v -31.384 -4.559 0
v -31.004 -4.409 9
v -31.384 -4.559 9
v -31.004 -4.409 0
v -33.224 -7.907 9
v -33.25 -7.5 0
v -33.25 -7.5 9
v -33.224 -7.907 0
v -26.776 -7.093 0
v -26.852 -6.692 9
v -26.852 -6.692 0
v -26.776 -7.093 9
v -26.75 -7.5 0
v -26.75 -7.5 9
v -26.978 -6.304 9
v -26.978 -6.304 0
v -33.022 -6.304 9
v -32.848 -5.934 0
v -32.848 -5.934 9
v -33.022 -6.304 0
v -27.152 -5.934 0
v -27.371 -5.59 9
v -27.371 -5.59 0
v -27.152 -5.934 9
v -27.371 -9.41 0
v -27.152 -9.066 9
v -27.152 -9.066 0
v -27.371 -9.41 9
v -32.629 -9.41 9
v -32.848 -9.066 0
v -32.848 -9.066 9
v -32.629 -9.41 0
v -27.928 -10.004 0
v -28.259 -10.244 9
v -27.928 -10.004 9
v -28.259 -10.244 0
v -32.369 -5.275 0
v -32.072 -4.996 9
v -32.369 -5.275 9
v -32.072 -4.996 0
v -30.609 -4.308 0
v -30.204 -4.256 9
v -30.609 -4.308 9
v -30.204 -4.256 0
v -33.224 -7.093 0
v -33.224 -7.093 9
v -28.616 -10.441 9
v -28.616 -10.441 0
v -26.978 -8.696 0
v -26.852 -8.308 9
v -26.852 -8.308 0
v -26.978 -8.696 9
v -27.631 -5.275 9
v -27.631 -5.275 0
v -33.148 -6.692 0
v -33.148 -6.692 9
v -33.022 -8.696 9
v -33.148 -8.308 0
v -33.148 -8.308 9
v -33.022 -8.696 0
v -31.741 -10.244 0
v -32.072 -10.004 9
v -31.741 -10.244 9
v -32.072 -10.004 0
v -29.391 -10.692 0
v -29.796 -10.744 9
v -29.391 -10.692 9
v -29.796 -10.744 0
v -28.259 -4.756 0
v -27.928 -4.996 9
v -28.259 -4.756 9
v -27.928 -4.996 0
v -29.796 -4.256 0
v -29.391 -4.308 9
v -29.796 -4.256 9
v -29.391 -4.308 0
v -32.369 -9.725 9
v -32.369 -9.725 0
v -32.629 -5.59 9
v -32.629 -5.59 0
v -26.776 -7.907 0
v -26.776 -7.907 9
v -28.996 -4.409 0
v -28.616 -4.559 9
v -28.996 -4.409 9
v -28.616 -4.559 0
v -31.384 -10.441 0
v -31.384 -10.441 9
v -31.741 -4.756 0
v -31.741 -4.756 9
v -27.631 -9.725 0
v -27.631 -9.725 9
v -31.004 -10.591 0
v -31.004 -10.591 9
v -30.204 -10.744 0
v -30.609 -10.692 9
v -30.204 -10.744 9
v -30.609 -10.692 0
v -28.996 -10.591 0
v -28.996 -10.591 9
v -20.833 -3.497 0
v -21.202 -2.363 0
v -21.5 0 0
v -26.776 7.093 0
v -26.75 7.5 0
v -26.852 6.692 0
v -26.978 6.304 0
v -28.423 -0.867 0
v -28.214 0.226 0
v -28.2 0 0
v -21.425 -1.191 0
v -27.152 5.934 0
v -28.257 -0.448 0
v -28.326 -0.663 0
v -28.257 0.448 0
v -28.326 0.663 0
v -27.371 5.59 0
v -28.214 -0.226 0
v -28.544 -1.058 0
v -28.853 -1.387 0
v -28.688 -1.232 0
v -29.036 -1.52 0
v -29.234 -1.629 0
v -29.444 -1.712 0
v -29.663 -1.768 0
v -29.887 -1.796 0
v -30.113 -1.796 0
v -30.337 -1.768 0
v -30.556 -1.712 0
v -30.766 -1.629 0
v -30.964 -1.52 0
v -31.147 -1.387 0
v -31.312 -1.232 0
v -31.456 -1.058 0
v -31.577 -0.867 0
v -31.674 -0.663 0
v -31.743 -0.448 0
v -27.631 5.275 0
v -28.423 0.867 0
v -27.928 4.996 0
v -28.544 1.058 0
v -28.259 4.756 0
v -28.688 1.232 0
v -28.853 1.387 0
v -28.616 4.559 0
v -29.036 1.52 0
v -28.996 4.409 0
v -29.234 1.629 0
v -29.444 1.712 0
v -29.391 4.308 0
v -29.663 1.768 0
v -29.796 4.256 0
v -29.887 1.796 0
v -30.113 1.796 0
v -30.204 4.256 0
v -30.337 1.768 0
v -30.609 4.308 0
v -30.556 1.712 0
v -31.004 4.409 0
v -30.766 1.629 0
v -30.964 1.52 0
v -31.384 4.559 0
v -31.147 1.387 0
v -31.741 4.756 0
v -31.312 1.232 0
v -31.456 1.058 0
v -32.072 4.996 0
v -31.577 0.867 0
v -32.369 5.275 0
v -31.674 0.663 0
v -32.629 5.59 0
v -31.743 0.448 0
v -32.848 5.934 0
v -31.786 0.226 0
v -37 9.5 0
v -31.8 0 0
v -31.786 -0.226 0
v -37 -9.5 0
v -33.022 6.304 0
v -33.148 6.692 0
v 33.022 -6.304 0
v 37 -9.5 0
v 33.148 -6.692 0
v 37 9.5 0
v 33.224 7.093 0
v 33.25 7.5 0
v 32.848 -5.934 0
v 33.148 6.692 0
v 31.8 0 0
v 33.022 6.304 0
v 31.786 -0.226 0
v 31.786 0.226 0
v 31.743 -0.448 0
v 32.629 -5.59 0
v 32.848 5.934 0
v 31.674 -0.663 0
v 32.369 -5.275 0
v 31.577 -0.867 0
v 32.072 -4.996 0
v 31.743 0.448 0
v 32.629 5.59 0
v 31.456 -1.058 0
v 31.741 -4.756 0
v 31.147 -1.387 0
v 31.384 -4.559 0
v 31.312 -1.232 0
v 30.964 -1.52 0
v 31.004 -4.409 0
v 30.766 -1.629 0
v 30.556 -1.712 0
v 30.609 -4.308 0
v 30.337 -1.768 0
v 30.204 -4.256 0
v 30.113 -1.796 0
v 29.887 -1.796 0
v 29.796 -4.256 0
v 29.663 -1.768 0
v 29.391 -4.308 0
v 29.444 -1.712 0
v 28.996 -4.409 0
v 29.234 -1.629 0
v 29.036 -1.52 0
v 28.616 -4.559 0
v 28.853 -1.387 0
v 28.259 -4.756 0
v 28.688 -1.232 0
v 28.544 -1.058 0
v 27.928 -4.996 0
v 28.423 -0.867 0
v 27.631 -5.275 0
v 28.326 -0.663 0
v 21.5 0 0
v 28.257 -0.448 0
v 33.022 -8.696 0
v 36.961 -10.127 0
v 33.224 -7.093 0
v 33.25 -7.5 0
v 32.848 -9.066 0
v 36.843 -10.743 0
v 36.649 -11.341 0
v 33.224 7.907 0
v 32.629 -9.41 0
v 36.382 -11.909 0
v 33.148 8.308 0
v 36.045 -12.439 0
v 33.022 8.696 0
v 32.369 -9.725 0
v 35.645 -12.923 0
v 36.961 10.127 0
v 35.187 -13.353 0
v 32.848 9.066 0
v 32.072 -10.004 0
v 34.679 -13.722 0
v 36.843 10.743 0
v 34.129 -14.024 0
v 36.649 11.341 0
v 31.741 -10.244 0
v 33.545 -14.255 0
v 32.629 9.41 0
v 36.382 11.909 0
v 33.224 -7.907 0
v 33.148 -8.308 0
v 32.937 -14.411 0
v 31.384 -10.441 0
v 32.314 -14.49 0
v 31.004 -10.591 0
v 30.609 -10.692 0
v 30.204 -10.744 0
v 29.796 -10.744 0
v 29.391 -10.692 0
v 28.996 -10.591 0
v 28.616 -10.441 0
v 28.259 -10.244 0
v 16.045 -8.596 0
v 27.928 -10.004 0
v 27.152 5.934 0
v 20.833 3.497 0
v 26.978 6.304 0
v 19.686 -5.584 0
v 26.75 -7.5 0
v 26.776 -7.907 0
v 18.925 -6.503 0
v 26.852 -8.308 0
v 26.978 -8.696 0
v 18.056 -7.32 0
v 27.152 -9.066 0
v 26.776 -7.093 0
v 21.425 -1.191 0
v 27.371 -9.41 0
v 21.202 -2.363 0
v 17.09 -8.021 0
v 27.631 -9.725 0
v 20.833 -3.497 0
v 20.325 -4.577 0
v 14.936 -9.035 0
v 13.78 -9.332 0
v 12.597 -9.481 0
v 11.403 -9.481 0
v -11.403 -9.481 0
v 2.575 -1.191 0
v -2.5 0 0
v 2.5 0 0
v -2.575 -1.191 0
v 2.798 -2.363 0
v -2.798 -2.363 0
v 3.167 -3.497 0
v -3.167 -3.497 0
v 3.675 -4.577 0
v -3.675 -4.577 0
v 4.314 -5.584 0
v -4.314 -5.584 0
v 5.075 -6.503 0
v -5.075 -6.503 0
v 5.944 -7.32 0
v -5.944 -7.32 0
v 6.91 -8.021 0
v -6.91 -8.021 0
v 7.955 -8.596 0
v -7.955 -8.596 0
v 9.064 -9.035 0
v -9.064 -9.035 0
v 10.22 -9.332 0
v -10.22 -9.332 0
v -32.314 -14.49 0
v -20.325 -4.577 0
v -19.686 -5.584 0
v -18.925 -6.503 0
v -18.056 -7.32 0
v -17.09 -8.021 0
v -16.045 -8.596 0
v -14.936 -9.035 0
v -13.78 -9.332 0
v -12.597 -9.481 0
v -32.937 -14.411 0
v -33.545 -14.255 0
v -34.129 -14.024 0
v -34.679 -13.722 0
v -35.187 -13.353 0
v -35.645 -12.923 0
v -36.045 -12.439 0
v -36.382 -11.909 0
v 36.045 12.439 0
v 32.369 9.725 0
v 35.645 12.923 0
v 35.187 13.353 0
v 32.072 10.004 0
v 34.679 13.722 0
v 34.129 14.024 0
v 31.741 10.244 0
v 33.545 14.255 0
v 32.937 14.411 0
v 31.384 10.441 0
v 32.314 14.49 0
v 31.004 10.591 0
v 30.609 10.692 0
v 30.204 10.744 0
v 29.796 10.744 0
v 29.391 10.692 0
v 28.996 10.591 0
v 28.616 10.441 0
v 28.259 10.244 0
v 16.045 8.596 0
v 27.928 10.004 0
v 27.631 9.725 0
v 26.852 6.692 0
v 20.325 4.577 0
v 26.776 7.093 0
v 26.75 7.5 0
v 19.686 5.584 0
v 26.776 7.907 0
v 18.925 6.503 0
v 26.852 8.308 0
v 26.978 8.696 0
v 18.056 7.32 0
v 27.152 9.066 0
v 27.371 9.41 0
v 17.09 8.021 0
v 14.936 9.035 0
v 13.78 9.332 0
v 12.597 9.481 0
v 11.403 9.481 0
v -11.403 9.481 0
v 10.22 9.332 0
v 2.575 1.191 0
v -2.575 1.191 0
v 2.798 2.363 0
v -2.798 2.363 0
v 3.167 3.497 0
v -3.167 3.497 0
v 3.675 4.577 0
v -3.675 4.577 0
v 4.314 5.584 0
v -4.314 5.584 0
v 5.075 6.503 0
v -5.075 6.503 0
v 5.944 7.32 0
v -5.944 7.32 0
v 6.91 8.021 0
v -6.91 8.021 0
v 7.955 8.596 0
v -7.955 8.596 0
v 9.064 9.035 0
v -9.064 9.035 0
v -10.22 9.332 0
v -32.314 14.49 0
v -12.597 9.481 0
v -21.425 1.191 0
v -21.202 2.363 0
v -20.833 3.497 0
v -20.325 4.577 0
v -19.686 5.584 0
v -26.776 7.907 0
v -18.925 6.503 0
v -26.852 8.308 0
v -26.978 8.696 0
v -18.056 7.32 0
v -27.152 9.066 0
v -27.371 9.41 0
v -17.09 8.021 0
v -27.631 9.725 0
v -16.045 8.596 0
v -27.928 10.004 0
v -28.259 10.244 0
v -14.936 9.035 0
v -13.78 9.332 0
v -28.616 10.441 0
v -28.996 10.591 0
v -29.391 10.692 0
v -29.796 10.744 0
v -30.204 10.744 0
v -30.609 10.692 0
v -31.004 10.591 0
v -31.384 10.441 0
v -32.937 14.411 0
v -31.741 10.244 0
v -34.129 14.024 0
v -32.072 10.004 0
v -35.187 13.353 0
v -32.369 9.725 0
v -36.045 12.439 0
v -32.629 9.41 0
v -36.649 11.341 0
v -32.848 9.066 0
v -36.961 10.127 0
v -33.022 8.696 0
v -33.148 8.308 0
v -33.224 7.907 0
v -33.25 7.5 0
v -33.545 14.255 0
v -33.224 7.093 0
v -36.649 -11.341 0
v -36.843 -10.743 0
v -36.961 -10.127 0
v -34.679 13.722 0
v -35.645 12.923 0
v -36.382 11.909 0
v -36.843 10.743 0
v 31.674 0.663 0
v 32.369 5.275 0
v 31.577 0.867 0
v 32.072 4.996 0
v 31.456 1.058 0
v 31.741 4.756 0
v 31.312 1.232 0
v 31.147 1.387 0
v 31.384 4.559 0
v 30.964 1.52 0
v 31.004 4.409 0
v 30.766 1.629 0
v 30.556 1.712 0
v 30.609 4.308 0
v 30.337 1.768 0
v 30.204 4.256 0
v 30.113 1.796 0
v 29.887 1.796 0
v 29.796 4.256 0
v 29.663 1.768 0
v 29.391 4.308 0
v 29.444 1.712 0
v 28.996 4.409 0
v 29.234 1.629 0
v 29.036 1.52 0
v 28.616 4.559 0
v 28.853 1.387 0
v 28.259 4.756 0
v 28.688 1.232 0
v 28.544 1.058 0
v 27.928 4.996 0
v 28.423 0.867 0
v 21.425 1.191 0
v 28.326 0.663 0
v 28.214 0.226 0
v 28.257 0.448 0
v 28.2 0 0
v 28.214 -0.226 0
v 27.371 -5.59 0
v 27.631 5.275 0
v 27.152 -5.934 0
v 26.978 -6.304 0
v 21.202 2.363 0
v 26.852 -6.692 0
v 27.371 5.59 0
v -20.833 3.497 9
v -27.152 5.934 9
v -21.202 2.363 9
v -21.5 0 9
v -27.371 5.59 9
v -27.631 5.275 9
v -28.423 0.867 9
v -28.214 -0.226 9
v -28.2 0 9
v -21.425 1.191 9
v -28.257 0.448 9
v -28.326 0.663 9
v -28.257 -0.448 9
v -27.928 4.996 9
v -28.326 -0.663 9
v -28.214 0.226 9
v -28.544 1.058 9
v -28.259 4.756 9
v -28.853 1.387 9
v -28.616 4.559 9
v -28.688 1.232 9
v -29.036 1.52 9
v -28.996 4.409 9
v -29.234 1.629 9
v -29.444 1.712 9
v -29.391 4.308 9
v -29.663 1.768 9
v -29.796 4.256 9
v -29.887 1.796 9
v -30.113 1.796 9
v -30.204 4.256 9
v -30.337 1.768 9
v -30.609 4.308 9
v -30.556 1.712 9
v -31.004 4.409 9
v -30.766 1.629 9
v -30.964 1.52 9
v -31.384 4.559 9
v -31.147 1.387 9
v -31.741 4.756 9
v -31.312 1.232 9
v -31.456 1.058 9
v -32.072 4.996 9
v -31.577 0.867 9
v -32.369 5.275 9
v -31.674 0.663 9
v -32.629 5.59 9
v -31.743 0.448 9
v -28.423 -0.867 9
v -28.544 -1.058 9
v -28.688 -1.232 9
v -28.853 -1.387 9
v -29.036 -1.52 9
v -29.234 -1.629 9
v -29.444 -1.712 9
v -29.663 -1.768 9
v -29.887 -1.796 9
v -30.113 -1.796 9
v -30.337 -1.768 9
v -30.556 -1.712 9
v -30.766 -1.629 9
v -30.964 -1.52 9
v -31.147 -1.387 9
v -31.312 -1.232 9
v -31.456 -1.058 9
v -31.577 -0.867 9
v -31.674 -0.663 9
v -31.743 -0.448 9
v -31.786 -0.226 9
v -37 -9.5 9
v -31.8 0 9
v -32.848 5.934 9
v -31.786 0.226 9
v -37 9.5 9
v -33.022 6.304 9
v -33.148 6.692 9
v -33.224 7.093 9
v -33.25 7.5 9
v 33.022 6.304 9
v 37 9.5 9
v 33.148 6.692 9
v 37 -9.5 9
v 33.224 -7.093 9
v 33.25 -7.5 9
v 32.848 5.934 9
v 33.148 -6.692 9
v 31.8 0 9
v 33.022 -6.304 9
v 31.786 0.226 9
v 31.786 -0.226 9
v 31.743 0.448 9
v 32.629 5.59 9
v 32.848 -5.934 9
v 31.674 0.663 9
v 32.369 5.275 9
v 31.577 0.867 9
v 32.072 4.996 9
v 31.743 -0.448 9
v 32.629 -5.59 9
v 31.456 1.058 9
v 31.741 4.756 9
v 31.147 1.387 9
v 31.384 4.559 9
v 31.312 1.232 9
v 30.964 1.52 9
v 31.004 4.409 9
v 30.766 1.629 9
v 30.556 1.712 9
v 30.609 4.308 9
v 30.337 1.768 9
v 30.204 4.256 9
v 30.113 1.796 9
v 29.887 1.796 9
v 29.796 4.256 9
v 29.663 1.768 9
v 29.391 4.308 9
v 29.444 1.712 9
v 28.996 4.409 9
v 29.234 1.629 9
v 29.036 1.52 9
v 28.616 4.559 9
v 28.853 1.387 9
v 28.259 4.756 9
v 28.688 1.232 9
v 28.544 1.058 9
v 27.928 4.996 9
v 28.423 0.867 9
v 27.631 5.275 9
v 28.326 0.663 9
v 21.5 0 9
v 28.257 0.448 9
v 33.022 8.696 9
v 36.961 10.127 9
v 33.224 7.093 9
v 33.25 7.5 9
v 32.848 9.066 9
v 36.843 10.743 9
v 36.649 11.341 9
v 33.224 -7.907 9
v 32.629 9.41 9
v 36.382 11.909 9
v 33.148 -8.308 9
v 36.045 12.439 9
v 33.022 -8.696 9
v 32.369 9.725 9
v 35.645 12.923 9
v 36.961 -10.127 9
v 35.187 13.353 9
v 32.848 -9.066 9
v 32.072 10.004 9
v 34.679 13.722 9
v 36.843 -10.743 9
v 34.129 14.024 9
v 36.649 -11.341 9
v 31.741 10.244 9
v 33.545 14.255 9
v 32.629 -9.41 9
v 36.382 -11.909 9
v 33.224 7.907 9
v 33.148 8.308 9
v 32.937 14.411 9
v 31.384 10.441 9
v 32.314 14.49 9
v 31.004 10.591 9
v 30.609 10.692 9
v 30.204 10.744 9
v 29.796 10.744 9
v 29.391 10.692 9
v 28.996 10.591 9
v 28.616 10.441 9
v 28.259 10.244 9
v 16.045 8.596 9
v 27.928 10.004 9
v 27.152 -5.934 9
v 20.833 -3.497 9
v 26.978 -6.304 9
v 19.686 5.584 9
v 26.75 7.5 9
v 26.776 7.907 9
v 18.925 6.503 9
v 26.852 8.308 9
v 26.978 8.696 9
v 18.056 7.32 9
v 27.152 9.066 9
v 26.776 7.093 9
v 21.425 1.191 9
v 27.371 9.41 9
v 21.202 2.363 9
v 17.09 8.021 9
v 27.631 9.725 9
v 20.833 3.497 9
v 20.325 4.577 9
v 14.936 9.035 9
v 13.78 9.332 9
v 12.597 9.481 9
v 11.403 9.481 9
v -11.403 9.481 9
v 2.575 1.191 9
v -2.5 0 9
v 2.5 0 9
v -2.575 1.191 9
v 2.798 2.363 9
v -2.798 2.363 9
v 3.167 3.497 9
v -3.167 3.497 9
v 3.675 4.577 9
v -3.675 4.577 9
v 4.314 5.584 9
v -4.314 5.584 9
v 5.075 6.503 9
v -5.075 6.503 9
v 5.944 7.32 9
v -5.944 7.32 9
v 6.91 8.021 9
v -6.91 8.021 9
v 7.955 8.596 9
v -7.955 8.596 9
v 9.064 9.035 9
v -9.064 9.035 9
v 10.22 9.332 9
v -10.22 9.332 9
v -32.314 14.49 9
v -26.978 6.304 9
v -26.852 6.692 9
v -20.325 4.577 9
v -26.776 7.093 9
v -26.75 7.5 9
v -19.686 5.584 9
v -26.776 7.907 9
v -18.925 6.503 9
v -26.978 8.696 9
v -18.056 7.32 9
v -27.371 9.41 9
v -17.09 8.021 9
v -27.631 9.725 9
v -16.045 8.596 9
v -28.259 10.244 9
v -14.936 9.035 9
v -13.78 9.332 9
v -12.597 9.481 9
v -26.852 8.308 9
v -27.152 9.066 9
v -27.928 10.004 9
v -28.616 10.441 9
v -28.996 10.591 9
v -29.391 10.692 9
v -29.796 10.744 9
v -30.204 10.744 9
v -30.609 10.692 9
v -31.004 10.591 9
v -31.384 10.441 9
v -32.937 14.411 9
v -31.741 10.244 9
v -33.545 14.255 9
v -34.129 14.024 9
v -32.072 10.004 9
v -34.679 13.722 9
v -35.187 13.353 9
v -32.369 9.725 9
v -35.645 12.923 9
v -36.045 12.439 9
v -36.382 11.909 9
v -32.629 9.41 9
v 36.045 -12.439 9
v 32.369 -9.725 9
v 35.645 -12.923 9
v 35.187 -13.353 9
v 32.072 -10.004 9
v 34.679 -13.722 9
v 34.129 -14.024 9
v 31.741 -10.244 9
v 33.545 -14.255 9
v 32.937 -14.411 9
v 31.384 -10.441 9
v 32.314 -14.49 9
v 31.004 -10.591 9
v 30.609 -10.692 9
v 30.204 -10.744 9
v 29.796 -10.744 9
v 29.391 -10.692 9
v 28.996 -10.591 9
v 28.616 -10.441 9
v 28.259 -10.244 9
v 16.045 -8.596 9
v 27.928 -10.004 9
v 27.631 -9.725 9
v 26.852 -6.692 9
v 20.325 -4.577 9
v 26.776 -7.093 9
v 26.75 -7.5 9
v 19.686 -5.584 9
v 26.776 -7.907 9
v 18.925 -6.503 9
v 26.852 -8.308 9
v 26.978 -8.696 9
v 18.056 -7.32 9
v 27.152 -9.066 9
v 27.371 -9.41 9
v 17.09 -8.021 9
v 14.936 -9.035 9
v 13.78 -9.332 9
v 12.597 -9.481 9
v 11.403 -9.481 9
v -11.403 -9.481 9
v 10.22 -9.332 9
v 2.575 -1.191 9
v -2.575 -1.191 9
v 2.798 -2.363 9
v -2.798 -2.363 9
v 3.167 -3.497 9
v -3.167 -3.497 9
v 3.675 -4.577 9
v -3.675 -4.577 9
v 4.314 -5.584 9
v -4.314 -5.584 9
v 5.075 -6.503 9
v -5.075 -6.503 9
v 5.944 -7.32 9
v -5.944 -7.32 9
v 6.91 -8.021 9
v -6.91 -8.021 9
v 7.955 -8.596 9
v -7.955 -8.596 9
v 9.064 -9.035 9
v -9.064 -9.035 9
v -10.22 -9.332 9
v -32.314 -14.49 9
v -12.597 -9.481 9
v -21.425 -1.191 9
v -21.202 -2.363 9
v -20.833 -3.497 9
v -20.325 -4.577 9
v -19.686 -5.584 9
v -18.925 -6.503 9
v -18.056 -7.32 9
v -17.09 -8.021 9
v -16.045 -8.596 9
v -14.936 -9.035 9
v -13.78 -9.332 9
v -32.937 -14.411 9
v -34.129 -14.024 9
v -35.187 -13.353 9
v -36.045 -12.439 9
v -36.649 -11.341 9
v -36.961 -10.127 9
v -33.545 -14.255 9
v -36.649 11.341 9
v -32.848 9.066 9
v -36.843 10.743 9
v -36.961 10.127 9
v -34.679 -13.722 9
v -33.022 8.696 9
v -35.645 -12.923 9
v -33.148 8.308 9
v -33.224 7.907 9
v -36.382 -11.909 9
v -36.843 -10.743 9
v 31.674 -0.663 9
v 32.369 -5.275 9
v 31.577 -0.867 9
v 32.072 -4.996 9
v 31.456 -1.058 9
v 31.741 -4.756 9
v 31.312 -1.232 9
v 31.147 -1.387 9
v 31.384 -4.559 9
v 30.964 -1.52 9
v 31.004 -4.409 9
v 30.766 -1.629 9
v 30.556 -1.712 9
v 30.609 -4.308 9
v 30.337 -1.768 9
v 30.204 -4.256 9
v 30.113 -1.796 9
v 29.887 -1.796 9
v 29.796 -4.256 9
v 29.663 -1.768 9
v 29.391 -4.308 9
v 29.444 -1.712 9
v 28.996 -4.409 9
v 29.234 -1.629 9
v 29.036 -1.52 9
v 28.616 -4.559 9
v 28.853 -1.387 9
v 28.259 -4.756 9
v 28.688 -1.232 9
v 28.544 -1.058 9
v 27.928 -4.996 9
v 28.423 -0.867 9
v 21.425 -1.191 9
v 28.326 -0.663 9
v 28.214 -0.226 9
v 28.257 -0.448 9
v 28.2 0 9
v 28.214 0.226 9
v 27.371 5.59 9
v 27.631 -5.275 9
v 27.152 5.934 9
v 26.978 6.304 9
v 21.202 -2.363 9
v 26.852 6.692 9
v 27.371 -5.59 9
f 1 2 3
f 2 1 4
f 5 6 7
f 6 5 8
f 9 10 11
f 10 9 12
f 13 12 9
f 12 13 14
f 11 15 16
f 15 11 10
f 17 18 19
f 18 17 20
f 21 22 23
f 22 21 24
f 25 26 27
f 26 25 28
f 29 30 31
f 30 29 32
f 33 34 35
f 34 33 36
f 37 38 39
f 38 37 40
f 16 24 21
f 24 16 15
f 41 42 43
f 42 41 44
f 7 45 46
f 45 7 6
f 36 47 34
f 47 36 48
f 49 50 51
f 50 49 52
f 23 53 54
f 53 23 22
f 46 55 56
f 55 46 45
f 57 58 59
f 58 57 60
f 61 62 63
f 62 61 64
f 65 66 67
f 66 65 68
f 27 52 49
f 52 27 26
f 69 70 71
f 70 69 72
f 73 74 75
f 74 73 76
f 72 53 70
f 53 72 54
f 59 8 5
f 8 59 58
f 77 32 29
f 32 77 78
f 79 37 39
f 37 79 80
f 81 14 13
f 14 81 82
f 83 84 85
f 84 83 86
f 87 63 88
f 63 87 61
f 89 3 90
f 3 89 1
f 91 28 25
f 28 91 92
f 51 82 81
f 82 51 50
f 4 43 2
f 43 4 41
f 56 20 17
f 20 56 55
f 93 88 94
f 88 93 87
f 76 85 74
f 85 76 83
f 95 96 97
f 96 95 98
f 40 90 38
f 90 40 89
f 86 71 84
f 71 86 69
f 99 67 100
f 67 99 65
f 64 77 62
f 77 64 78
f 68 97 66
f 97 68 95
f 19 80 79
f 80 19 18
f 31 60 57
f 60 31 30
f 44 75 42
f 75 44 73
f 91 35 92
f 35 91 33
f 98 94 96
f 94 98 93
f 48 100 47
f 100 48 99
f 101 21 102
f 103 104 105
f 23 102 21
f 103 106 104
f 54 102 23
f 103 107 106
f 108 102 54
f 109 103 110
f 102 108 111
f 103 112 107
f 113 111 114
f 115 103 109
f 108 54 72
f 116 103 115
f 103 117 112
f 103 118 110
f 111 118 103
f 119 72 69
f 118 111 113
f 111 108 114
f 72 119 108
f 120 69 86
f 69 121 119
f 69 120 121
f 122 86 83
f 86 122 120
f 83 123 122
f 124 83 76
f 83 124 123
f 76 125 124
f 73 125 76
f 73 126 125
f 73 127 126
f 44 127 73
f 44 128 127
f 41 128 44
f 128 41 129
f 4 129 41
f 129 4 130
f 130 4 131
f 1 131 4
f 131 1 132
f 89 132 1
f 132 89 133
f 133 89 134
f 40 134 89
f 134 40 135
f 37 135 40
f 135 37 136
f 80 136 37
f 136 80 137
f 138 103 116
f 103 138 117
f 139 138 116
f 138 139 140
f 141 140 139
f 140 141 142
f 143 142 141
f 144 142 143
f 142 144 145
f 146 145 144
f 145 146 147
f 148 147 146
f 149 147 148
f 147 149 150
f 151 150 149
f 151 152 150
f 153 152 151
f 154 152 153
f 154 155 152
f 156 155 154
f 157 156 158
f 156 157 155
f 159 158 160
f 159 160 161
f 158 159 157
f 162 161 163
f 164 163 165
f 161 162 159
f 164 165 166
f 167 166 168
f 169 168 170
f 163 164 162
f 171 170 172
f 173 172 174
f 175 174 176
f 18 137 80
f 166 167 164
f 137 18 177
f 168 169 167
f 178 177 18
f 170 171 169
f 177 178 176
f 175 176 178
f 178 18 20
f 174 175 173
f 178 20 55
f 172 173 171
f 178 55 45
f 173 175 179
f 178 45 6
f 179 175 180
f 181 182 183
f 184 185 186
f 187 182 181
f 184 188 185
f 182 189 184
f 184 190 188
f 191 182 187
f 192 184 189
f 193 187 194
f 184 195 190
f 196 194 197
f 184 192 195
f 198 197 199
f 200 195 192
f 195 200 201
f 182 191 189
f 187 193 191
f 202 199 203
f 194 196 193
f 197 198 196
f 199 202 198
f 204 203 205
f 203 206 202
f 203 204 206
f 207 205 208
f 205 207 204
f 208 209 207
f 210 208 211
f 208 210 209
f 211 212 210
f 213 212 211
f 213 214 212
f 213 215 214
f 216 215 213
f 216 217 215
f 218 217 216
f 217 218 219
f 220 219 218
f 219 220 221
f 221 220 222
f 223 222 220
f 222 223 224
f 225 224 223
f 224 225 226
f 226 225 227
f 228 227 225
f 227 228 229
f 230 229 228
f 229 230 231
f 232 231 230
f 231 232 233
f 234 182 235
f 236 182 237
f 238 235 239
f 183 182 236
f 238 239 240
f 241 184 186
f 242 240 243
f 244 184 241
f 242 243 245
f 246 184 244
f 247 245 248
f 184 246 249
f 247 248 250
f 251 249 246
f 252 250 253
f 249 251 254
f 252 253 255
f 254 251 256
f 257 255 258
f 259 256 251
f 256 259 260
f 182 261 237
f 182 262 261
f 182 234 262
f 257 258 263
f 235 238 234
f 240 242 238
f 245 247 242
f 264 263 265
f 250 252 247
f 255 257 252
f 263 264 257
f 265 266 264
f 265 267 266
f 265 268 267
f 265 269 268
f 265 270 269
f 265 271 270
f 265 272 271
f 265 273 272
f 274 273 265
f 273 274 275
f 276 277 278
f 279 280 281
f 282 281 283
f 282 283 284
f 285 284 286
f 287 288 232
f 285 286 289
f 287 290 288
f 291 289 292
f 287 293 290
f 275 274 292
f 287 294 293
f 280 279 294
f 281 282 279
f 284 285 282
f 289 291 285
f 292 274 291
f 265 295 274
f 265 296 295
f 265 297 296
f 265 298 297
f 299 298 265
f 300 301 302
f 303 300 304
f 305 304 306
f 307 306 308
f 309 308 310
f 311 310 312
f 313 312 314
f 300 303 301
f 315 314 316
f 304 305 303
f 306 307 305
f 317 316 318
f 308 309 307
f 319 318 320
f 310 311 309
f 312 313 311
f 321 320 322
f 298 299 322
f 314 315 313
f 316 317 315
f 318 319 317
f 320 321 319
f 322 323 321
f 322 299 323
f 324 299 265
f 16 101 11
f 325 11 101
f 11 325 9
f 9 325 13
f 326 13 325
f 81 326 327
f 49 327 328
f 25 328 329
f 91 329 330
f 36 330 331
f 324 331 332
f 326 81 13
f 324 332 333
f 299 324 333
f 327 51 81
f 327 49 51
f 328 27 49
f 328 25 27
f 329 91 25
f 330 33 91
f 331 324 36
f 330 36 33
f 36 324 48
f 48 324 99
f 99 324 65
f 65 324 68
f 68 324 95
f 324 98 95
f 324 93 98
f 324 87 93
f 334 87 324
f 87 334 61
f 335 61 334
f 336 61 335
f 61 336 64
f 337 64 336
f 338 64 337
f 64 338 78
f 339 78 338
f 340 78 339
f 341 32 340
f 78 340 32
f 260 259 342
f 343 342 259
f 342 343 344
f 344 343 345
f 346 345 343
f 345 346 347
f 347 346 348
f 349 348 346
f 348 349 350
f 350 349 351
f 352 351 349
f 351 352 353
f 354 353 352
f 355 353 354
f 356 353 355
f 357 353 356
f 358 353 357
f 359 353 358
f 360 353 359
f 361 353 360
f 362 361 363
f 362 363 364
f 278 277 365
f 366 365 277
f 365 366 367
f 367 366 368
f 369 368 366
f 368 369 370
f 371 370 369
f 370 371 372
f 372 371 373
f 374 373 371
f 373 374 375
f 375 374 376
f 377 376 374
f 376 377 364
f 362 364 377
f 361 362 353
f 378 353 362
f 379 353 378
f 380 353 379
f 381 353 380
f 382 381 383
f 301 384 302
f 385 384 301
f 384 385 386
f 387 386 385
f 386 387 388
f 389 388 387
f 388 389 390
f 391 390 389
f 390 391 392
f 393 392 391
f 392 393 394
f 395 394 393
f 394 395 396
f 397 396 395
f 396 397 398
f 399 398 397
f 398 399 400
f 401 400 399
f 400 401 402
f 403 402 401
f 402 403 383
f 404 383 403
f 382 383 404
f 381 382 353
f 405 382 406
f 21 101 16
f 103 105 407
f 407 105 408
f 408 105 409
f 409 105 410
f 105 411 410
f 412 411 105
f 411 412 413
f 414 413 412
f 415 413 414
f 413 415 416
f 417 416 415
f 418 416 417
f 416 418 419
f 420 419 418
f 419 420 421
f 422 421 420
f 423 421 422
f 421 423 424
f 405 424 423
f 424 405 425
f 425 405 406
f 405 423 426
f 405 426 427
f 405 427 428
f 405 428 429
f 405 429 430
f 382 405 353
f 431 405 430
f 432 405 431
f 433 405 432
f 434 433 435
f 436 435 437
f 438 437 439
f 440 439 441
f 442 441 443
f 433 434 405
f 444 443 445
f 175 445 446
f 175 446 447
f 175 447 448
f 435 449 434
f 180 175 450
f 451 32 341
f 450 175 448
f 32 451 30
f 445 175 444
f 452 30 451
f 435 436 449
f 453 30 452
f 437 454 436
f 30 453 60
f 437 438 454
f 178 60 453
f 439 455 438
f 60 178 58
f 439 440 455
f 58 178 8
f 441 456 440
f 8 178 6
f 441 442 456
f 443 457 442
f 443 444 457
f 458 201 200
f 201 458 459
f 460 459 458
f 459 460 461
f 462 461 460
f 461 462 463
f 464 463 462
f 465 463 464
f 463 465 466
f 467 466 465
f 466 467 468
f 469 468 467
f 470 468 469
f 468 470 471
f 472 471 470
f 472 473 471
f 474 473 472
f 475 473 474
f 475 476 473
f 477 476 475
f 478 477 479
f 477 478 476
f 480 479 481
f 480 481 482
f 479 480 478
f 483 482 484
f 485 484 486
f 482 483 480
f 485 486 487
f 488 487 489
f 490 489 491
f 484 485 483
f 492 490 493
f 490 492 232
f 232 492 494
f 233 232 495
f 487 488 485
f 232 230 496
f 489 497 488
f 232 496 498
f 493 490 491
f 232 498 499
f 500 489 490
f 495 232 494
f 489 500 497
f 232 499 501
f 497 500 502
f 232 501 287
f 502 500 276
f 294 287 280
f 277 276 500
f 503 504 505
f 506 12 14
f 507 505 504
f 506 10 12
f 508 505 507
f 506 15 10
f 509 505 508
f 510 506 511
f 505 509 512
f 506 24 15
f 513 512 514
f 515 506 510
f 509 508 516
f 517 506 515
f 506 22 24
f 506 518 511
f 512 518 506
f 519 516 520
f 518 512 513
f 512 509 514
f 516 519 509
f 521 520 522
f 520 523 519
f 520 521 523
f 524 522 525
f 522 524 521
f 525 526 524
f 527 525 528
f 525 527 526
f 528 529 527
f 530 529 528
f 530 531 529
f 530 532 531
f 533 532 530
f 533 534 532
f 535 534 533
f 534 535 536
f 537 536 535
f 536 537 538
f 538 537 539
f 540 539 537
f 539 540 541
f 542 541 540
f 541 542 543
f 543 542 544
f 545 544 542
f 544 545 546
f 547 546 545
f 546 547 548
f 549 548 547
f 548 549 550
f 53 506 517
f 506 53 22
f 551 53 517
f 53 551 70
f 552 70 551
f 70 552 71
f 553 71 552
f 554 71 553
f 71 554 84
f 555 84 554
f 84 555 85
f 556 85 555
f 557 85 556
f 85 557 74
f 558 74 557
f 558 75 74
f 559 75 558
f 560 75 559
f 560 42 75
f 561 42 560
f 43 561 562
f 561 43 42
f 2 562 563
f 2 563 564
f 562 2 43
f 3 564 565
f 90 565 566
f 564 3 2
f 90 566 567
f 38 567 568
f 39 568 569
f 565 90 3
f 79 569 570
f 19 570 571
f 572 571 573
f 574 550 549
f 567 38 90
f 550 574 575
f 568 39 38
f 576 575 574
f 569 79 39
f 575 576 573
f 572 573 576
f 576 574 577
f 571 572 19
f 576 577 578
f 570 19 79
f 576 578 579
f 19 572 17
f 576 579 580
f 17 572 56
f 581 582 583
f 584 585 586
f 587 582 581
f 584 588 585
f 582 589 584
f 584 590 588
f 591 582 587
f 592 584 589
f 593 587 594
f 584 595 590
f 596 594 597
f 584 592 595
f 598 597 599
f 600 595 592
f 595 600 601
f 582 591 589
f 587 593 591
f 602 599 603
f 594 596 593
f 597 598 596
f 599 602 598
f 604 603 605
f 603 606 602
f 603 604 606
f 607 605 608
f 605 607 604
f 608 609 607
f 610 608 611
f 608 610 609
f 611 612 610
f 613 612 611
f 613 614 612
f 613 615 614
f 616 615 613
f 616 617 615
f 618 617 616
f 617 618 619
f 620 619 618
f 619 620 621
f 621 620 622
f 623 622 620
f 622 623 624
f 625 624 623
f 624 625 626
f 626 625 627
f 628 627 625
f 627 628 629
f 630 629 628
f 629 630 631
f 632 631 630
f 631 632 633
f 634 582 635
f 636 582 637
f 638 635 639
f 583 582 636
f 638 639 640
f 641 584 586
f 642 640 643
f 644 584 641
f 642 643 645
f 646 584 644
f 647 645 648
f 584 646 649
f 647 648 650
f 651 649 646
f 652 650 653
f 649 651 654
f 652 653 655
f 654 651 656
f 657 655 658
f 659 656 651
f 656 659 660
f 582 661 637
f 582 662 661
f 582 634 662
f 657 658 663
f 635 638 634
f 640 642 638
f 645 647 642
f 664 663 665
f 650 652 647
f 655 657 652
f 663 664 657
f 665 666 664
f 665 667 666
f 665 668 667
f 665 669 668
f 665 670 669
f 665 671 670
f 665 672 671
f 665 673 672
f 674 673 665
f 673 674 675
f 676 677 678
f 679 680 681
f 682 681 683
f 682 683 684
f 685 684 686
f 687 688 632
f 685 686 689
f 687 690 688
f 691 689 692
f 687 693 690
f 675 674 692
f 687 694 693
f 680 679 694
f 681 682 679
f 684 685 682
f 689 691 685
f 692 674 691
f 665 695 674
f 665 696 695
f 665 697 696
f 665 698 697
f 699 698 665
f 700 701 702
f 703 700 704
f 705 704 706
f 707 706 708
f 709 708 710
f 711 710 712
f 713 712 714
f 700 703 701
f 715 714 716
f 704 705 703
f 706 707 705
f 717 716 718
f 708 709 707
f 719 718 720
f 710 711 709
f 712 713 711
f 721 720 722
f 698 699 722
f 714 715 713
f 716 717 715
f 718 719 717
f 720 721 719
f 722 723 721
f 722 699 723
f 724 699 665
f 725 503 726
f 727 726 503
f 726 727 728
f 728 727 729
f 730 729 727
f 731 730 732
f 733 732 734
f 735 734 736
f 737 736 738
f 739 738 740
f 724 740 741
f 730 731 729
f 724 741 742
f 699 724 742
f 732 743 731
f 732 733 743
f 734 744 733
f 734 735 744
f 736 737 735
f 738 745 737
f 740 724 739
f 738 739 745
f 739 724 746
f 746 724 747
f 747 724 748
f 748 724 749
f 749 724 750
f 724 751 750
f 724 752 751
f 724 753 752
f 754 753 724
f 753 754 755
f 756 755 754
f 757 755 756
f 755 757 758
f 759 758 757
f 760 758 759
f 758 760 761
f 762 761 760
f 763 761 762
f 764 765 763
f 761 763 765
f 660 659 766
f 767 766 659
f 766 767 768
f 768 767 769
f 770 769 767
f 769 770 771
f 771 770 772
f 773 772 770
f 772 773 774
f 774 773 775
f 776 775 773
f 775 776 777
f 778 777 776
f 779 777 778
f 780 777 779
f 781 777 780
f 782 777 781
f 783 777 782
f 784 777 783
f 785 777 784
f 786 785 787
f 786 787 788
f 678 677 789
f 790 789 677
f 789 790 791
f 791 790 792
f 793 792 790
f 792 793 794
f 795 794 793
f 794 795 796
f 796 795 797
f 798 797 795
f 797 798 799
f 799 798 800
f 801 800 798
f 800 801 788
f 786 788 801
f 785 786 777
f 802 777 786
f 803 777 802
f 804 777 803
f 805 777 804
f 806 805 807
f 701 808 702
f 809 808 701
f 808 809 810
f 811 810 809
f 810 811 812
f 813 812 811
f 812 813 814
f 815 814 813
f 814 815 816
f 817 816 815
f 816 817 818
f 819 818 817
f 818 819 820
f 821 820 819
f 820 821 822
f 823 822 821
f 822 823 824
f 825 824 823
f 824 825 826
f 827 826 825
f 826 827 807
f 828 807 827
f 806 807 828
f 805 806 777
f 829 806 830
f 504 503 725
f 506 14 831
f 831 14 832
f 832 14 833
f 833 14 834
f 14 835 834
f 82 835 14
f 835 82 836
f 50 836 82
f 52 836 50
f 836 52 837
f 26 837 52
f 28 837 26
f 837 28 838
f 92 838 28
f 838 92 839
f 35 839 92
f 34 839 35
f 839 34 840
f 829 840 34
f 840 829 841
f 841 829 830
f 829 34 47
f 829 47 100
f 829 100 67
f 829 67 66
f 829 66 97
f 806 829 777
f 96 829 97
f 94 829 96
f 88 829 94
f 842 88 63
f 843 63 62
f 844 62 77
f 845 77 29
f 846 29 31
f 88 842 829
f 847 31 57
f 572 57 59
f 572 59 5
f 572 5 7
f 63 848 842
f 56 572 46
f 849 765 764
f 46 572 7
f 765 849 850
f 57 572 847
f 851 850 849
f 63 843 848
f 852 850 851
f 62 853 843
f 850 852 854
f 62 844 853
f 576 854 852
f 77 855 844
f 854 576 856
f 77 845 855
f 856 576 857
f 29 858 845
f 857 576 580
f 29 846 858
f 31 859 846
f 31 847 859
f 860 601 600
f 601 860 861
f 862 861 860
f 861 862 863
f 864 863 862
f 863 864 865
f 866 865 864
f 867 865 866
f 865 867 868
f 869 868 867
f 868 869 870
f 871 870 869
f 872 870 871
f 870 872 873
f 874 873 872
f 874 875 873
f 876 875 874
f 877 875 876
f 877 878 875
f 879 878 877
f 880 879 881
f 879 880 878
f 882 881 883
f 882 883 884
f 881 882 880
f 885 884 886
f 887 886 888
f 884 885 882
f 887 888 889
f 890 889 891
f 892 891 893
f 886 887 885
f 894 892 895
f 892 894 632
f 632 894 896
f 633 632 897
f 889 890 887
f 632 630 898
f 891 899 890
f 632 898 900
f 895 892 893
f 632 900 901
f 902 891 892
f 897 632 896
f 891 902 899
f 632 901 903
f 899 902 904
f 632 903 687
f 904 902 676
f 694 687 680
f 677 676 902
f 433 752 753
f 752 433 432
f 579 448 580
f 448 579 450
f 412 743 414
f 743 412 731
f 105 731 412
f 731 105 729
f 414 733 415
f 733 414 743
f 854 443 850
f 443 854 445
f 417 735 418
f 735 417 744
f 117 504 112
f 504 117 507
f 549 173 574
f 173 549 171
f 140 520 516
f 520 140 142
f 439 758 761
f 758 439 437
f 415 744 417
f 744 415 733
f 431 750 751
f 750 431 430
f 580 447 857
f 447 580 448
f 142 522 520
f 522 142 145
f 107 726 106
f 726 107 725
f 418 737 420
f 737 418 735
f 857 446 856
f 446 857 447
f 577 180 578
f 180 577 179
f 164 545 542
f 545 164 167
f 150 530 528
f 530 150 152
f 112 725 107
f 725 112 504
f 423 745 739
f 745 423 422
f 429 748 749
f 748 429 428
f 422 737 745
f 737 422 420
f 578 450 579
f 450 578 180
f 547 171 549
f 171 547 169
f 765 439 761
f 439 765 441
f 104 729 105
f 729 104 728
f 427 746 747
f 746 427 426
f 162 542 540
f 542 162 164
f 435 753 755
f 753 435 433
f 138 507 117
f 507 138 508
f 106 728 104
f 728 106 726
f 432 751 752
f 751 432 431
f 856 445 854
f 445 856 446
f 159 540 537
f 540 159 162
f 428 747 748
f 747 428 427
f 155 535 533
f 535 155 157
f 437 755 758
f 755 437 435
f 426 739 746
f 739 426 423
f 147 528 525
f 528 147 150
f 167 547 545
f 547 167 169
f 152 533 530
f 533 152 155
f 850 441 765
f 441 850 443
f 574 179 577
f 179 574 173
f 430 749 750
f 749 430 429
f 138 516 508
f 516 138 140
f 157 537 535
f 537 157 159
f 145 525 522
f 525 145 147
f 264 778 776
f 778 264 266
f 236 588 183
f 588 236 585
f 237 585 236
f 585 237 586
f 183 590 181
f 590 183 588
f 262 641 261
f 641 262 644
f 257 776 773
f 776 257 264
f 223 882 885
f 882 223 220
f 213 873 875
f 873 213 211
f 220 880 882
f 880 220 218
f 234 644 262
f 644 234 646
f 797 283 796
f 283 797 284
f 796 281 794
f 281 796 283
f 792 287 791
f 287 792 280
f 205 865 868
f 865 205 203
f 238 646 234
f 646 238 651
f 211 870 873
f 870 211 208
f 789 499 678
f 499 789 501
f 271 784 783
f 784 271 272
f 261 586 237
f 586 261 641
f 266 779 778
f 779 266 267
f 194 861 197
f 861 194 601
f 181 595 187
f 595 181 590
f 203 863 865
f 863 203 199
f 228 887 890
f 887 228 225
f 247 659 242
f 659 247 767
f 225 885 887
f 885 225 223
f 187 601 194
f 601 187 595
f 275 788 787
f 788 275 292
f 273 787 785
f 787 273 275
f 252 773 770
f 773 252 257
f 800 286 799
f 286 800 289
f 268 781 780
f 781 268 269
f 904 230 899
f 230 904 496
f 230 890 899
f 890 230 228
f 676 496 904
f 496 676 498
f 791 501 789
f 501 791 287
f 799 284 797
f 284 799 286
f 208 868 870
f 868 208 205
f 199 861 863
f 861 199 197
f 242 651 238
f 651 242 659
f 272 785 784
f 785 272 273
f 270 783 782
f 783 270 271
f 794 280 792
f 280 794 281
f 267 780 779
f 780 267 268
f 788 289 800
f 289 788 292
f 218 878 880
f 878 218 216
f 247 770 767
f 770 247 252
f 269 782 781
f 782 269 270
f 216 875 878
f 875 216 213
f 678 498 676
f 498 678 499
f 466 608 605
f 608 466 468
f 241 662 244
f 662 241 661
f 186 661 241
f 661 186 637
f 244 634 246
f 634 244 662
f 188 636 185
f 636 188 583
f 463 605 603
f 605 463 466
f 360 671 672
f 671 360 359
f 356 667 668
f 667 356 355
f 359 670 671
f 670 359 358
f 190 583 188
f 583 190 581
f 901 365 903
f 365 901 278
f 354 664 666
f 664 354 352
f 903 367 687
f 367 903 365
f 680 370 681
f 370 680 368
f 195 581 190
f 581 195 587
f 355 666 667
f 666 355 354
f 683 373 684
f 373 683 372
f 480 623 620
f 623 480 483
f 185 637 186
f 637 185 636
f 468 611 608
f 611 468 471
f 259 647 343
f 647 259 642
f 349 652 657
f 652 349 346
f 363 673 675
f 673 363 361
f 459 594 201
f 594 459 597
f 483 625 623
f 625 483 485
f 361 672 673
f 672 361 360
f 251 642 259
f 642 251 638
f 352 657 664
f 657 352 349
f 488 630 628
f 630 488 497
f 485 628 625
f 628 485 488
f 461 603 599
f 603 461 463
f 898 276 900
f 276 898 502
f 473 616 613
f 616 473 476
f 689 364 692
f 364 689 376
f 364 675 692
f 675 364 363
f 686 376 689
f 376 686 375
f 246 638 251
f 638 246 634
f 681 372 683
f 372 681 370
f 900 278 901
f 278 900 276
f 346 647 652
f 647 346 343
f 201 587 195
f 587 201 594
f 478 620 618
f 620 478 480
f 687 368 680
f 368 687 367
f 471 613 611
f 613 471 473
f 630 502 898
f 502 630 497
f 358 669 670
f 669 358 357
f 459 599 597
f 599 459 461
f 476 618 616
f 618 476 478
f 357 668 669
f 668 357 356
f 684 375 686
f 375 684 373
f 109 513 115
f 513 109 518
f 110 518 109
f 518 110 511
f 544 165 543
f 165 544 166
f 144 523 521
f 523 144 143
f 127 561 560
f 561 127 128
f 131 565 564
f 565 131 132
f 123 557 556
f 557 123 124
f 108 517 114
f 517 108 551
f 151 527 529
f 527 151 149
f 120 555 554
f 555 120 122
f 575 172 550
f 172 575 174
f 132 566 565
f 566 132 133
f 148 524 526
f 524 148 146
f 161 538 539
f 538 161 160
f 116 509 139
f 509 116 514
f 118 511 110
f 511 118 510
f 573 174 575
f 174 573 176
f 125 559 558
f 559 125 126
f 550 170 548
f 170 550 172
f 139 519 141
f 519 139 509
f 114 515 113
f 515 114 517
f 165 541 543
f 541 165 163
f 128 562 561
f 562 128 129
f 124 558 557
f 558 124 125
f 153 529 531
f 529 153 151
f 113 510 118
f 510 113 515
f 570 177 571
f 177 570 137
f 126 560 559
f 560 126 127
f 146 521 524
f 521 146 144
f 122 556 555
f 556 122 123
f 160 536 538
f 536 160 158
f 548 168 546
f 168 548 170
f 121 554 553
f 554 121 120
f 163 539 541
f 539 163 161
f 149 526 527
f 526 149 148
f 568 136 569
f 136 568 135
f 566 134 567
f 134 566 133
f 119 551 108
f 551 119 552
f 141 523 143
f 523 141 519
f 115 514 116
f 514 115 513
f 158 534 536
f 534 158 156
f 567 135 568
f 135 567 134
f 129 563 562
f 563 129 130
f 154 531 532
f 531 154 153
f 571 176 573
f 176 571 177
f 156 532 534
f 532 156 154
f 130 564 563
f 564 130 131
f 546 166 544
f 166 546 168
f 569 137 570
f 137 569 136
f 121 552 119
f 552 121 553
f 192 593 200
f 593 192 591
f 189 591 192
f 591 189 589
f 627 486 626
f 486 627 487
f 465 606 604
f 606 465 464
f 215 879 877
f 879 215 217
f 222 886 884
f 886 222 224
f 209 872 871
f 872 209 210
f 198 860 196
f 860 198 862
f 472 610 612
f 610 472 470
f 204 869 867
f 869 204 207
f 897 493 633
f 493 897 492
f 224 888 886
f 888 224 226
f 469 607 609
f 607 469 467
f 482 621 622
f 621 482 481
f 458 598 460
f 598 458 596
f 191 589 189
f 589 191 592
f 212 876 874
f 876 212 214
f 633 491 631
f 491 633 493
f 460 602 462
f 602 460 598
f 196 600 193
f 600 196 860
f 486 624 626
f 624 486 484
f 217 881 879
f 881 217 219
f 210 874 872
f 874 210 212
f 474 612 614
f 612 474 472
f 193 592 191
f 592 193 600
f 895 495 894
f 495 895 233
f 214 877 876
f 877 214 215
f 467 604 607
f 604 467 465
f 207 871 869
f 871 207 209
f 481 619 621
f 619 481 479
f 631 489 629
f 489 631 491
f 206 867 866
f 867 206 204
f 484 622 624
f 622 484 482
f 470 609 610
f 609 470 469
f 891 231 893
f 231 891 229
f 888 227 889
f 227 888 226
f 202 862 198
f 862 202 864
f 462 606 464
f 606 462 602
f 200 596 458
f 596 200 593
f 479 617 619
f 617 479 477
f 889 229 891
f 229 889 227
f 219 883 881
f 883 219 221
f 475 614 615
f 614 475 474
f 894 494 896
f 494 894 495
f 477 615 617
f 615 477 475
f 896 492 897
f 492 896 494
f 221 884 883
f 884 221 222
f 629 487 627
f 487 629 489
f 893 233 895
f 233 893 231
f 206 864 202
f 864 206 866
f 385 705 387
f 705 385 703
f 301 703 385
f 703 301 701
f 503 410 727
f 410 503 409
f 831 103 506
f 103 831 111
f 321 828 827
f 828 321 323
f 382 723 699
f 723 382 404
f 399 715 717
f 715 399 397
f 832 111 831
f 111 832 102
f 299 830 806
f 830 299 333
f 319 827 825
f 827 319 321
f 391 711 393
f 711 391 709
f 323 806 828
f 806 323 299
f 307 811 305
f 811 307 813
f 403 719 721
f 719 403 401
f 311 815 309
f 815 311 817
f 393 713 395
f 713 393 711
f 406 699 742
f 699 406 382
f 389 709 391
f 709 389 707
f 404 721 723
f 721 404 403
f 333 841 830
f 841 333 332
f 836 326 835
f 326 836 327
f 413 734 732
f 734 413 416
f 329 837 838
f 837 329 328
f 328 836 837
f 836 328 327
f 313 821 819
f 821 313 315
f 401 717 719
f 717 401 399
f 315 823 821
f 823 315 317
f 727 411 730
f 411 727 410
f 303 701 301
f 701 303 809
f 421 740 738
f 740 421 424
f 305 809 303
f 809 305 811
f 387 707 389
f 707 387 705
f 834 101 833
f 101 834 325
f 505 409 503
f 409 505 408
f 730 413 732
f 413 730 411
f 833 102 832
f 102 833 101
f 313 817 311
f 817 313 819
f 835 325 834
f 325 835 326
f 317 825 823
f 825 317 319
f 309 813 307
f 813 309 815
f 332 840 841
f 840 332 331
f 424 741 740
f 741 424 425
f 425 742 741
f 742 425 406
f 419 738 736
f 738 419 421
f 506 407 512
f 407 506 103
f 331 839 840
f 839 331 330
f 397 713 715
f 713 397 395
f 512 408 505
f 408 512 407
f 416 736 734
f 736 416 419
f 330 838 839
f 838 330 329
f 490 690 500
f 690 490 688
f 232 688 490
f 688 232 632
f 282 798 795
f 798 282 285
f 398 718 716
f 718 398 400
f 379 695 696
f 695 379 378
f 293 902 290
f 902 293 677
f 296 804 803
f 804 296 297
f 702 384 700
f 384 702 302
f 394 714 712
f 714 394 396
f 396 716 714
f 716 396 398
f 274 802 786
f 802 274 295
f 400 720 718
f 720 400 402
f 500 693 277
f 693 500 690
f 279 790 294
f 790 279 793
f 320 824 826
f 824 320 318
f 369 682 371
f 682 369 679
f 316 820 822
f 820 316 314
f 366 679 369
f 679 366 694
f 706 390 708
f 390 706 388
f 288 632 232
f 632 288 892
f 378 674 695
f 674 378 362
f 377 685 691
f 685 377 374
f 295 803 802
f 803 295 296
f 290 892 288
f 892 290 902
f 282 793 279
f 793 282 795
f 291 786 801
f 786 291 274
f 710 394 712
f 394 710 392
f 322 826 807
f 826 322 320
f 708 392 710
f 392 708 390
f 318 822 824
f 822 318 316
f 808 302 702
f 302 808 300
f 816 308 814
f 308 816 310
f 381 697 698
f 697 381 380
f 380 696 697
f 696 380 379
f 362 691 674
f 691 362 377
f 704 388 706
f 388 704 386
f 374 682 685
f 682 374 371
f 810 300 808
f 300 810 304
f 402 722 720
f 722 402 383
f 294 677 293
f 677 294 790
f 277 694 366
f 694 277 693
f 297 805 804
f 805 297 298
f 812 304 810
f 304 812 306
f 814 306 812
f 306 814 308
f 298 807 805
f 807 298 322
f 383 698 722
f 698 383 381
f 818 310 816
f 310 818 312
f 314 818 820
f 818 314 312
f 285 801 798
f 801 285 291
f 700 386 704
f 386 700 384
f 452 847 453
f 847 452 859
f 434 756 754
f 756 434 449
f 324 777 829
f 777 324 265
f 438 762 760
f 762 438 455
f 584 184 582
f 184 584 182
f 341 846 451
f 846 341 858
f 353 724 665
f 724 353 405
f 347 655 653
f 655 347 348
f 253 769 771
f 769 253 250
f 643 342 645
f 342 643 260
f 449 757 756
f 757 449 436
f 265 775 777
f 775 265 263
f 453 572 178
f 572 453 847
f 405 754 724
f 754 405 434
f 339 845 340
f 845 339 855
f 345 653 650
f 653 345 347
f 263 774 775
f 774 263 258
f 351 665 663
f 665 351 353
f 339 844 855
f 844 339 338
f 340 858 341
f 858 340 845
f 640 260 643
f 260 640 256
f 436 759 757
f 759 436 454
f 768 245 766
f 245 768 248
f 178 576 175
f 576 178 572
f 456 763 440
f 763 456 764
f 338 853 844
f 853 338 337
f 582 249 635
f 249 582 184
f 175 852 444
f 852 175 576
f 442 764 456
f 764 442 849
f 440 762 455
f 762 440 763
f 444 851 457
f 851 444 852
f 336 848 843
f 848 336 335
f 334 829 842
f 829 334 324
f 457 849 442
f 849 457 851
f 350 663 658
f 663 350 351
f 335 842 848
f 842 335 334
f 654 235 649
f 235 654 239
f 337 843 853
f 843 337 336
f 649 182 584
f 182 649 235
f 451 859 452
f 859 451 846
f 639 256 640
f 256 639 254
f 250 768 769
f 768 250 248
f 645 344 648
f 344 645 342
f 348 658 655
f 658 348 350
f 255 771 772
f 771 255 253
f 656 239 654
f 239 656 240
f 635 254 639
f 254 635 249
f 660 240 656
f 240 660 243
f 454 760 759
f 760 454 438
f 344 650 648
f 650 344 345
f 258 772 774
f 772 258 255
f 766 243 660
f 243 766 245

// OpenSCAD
$fn = 50;

difference() {
	union() {
		hull() {
			translate(v = [-32.0, 9.5, 0]) {
				cylinder(h = 9, r = 5);
			}
			translate(v = [32.0, 9.5, 0]) {
				cylinder(h = 9, r = 5);
			}
			translate(v = [-32.0, -9.5, 0]) {
				cylinder(h = 9, r = 5);
			}
			translate(v = [32.0, -9.5, 0]) {
				cylinder(h = 9, r = 5);
			}
		}
	}
	union() {
		translate(v = [-30.0, -7.5, 0]) {
			cylinder(h = 9, r = 3.25);
		}
		translate(v = [-30.0, 7.5, 0]) {
			cylinder(h = 9, r = 3.25);
		}
		translate(v = [30.0, -7.5, 0]) {
			cylinder(h = 9, r = 3.25);
		}
		translate(v = [30.0, 7.5, 0]) {
			cylinder(h = 9, r = 3.25);
		}
		translate(v = [-30.0, 0.0, 0]) {
			cylinder(h = 9, r = 1.8);
		}
		translate(v = [30.0, 0.0, 0]) {
			cylinder(h = 9, r = 1.8);
		}
		translate(v = [-12.0, 0, 0.0]) {
			cylinder(h = 9, r = 9.5);
		}
		translate(v = [12.0, 0, 0.0]) {
			cylinder(h = 9, r = 9.5);
		}
	}
}
